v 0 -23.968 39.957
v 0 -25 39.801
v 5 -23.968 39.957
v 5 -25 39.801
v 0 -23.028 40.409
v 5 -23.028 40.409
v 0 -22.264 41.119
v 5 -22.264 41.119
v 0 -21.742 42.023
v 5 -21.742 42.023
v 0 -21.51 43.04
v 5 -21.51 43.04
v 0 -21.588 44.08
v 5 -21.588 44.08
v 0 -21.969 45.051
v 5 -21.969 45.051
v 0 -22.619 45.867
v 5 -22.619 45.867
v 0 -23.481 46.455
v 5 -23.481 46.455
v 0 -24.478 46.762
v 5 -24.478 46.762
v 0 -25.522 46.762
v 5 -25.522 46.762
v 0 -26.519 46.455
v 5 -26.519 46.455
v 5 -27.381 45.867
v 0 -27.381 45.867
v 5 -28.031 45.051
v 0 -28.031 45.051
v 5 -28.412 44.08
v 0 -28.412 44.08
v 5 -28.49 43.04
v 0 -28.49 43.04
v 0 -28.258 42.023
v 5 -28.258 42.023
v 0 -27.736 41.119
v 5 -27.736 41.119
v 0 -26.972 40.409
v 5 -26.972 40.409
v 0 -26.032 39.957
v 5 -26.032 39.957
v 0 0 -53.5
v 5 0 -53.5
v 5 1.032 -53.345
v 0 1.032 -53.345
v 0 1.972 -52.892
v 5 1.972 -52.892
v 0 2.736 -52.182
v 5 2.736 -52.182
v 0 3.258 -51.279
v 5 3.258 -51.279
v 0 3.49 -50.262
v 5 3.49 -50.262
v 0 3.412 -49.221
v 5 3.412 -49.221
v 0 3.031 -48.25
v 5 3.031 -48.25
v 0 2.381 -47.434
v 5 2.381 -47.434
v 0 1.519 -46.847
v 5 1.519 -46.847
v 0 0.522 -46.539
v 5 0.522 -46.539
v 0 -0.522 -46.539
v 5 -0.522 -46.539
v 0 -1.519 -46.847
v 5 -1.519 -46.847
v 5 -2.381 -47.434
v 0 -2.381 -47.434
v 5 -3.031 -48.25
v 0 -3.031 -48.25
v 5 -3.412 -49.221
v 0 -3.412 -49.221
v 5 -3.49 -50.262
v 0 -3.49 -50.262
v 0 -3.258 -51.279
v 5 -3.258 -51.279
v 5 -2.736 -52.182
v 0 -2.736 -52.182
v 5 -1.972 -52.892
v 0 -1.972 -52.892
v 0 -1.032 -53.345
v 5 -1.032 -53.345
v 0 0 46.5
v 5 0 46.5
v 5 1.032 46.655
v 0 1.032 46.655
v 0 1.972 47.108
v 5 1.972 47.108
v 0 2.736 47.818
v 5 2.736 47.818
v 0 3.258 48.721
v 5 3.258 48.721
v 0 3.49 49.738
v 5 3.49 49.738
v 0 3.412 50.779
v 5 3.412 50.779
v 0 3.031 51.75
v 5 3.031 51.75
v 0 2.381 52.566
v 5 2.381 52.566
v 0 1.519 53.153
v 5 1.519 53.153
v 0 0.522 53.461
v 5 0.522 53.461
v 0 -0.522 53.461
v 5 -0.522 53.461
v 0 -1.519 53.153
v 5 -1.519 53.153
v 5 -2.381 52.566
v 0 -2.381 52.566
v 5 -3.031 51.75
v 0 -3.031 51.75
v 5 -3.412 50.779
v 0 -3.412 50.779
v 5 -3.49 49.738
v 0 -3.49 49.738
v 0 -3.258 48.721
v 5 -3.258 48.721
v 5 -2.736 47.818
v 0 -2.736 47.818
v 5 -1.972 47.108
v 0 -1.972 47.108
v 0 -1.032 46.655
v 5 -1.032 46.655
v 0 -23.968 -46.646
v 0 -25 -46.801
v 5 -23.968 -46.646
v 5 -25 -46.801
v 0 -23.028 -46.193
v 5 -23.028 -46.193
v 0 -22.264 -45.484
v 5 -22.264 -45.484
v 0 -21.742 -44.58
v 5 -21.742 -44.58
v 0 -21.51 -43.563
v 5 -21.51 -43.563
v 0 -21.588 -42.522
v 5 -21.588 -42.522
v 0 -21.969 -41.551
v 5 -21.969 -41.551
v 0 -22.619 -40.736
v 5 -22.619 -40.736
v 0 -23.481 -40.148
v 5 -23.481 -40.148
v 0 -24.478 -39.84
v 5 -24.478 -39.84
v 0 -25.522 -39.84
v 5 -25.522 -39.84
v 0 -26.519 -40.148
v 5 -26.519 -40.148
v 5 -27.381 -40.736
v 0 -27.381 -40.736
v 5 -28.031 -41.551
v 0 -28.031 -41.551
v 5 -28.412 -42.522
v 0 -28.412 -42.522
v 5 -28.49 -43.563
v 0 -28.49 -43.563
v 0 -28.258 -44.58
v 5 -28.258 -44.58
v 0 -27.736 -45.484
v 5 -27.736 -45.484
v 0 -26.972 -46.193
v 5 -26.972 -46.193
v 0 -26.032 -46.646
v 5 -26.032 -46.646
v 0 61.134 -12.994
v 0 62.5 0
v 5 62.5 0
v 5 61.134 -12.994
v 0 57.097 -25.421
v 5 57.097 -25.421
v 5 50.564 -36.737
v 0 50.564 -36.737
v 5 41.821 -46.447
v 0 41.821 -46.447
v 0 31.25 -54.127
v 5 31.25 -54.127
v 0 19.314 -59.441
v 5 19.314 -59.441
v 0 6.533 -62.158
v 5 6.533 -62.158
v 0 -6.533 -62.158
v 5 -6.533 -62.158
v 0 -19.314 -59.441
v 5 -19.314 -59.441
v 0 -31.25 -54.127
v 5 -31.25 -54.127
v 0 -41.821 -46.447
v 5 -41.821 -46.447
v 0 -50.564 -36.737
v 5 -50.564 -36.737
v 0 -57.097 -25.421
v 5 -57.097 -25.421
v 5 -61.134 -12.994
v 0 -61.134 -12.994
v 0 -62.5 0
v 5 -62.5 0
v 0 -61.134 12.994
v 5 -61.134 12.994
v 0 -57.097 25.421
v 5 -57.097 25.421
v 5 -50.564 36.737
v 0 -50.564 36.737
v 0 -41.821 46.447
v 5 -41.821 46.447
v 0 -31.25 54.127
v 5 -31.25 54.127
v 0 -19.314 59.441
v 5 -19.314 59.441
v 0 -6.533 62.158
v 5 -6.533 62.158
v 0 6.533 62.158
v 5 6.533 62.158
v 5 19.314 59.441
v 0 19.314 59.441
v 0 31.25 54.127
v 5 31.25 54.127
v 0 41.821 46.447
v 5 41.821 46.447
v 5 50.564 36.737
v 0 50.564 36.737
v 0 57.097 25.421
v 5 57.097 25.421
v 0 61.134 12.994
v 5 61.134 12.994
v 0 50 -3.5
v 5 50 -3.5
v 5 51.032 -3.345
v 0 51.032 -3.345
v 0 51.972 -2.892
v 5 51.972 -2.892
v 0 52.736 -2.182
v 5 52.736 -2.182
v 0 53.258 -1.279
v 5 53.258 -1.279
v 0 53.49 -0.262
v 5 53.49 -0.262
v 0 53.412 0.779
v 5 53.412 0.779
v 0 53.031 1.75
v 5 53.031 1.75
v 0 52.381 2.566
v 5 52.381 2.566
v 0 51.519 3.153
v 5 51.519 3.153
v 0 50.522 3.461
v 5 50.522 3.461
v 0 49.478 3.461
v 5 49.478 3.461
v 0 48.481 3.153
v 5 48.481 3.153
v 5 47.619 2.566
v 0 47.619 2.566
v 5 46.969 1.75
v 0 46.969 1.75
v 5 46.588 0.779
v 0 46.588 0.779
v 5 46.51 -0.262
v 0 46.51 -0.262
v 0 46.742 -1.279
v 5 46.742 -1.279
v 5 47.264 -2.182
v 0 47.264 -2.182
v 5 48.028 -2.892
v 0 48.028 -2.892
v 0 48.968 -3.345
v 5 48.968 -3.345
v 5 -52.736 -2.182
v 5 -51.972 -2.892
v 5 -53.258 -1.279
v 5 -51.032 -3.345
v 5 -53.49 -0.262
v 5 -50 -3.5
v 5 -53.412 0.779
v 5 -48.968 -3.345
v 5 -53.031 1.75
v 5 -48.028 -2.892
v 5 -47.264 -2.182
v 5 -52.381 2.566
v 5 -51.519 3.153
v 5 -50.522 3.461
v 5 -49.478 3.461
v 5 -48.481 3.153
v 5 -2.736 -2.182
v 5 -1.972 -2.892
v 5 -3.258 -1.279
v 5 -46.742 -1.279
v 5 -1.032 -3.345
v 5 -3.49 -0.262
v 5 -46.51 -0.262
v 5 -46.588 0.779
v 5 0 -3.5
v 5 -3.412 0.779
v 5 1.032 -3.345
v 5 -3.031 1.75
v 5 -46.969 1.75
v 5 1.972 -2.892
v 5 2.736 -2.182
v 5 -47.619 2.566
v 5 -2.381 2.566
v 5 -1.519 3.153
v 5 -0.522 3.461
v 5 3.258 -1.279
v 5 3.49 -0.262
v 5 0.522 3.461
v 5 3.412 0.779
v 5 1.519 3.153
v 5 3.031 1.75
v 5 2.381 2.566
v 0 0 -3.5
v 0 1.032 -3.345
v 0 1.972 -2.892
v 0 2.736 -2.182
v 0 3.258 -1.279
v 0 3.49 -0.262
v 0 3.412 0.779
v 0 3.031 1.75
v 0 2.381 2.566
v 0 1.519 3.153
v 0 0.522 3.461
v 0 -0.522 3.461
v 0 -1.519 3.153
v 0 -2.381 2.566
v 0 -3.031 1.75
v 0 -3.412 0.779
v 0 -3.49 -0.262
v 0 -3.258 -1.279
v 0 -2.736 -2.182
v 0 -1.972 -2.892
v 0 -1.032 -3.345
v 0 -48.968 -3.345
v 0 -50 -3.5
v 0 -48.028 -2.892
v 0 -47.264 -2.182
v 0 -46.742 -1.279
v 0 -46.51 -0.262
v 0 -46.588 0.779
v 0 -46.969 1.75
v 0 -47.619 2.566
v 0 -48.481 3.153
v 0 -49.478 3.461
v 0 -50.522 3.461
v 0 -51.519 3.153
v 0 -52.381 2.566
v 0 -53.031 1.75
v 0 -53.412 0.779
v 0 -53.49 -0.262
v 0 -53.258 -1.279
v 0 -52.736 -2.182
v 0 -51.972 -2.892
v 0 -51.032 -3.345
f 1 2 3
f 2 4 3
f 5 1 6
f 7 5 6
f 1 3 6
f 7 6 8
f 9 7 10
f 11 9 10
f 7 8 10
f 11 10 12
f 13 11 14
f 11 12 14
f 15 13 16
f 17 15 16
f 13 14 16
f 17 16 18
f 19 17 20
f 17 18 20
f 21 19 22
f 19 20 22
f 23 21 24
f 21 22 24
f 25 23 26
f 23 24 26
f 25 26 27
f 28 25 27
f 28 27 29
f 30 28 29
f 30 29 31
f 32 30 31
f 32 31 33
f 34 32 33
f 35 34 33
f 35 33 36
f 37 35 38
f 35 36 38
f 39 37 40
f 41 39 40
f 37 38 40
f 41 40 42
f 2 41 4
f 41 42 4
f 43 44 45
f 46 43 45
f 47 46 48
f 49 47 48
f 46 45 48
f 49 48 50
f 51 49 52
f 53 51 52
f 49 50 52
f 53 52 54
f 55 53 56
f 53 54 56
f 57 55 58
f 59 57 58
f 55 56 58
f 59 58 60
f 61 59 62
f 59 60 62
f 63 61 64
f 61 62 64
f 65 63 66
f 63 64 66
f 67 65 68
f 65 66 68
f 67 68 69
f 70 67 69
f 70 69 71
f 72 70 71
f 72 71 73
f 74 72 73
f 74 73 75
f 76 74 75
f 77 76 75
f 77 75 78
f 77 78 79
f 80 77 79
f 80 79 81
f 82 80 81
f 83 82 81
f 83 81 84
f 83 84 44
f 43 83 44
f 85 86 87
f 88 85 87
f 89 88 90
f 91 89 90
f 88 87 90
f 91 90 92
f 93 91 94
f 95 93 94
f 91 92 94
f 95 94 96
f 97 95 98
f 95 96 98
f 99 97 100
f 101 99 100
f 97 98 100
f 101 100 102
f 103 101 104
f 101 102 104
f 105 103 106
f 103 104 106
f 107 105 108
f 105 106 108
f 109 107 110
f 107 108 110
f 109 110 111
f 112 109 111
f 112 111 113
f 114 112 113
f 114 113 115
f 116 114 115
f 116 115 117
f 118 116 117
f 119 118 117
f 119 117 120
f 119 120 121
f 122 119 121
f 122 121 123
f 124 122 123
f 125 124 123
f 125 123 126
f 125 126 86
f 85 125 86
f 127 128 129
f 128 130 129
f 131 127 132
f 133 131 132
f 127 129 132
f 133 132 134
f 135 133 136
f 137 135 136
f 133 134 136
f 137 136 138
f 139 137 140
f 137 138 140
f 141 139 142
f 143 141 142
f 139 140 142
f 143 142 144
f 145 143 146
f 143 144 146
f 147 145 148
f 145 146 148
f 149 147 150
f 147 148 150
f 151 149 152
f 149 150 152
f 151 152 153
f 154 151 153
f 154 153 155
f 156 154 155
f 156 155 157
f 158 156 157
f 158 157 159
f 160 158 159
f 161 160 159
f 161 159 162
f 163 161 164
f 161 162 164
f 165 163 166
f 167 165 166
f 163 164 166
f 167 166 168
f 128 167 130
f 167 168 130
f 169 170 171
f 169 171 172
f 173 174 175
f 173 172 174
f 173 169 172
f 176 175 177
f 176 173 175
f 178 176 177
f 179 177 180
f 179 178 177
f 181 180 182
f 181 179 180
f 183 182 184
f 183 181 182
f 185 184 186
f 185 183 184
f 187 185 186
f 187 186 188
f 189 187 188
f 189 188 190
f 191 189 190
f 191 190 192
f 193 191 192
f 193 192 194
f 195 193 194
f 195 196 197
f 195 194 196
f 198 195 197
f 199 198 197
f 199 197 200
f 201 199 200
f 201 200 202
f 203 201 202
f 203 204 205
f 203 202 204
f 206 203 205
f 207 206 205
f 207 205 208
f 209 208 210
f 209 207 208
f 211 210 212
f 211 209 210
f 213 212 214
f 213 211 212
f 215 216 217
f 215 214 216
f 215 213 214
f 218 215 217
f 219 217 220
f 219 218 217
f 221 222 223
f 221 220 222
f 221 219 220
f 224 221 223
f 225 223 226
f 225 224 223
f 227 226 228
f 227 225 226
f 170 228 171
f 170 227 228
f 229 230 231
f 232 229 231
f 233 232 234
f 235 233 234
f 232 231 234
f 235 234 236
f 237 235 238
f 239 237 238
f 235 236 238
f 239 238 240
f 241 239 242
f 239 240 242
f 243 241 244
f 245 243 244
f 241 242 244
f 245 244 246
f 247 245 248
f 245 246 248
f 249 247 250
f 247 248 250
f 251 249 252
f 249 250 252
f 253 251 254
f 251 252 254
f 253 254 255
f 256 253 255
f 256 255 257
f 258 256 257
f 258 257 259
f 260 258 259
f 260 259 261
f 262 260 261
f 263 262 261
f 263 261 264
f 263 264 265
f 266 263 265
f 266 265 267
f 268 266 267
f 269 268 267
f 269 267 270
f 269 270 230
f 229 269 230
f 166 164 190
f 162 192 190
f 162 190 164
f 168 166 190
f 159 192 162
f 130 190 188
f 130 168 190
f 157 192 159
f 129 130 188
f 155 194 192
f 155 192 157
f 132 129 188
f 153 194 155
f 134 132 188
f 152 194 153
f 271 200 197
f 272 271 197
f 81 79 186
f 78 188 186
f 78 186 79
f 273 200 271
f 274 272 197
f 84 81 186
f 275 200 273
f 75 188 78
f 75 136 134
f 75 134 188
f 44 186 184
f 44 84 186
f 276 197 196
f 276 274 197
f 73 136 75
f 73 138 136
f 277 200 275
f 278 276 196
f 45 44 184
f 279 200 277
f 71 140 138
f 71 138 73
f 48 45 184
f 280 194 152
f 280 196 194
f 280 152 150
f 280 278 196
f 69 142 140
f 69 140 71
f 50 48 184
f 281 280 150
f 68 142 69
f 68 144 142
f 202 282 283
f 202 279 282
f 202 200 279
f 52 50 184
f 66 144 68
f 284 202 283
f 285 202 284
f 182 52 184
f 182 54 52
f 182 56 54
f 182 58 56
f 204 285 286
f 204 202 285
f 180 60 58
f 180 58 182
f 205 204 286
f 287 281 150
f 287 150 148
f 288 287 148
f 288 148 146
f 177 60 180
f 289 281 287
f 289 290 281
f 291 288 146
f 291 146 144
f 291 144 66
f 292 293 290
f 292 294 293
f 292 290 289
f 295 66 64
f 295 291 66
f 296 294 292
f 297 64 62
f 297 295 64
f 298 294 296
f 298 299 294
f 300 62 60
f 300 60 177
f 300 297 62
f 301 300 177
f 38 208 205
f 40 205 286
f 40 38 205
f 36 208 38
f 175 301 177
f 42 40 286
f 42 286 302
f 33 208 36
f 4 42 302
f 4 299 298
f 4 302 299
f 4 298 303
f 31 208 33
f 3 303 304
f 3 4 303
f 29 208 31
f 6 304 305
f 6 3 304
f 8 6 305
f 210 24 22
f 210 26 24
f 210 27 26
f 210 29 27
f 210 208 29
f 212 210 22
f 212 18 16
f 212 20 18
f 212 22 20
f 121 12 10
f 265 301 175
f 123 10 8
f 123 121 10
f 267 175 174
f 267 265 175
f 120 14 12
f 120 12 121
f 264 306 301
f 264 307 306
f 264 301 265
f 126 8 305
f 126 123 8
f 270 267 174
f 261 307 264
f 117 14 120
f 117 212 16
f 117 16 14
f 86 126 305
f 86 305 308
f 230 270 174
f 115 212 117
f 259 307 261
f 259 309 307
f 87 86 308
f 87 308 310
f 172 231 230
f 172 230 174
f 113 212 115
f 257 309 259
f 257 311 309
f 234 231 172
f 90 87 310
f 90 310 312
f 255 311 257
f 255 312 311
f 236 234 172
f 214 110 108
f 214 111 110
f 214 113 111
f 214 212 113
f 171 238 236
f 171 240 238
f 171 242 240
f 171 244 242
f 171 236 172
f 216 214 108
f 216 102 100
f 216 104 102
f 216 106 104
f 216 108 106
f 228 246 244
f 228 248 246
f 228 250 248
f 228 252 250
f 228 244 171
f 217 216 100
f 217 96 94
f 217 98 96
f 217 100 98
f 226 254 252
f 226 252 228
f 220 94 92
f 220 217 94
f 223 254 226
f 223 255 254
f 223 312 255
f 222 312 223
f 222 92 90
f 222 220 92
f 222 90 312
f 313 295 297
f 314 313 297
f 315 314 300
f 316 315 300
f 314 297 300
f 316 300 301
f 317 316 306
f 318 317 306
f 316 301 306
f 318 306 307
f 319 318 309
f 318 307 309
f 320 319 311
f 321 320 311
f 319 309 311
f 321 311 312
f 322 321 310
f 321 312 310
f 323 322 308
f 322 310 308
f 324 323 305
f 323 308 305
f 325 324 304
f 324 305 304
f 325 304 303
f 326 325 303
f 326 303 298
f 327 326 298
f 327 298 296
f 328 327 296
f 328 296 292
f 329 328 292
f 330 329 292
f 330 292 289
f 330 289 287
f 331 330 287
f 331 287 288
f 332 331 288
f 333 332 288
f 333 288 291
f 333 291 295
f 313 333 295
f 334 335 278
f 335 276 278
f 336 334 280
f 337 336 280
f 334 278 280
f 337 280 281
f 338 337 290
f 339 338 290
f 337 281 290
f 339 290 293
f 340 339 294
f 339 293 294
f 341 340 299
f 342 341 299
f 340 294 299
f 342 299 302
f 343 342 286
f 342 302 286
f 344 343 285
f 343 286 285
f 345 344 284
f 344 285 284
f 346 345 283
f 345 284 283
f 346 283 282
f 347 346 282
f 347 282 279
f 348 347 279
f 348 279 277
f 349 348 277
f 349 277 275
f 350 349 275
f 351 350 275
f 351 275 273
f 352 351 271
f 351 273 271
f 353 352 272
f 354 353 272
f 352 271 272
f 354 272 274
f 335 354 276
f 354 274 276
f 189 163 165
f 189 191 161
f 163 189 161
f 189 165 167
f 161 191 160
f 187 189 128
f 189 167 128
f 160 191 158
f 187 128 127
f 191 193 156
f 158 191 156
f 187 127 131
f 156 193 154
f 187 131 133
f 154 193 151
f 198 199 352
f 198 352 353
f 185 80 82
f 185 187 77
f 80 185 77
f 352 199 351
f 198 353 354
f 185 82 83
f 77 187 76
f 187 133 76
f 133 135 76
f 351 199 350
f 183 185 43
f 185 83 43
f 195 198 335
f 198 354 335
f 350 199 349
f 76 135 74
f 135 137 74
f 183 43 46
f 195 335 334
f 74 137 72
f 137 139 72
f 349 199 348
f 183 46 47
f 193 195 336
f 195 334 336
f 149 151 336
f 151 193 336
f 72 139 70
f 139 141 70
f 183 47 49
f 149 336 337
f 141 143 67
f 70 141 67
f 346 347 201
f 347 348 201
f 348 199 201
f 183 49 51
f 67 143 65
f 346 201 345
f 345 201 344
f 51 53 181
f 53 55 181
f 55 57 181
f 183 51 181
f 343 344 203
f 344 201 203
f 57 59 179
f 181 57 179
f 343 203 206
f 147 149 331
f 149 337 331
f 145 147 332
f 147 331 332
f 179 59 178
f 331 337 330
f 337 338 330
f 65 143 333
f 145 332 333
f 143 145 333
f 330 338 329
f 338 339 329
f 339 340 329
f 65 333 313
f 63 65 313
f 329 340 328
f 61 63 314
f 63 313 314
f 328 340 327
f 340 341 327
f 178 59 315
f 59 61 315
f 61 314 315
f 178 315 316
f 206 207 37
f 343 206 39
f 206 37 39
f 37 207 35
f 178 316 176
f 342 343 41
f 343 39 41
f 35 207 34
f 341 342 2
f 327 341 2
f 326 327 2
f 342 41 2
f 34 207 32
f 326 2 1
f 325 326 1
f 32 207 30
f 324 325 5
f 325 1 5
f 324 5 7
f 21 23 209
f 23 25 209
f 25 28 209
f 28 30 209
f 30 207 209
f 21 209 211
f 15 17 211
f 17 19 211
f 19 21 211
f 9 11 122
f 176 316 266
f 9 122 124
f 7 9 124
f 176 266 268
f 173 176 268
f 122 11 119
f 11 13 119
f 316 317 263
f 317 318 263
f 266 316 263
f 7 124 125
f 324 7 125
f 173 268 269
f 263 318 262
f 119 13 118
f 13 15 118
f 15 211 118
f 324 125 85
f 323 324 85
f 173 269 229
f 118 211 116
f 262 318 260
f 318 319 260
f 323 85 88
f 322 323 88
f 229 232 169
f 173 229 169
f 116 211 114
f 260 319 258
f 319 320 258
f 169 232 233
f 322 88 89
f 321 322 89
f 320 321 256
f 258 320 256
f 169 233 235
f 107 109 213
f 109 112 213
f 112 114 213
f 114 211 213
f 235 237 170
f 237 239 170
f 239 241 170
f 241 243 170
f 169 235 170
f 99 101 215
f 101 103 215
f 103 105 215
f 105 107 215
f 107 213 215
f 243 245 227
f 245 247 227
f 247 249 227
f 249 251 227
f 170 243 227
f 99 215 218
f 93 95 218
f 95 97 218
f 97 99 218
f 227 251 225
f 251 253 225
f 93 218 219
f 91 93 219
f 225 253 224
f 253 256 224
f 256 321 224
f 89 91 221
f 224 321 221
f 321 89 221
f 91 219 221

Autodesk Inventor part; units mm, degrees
ref_plane "YZ Plane" through (0, 0, 0) normal (1, 0, 0) x (0, 1, 0)
ref_plane "XZ Plane" through (0, 0, 0) normal (0, 1, 0) x (-1, 0, 0)
ref_plane "XY Plane" through (0, 0, 0) normal (0, 0, 1) x (1, 0, 0)
sketch "Sketch1" plane through (0, 0, 0) normal (1, 0, 0) x (0, 1, 0)
  circle A0 centre (0, 0) radius 62.5
  dimension "d0" = 125
extrude "Extrusion1" add sketch "Sketch1" along normal blind 5
sketch "Sketch2" plane through (5, 0, 0) normal (1, 0, 0) x (0, 0, -1)
  circle A0 centre (0, 50) radius 3.5
  circle A1 centre (-50, 0) radius 3.5
  circle A2 centre (0, -50) radius 3.5
  circle A3 centre (50, 0) radius 3.5
  circle A4 centre (-43.3013, -25) radius 3.5
  circle A5 centre (43.3013, -25) radius 3.5
  circle A6 centre (0, 0) radius 3.5
  dimension "d3" = 7
  dimension "d4" = 0
  dimension "d5" = 50
  dimension "d8" = 360
  dimension "d12" = 360
  dimension "d16" = 7
extrude "Extrusion2" cut sketch "Sketch2" against normal through all
properties part number "Base"
